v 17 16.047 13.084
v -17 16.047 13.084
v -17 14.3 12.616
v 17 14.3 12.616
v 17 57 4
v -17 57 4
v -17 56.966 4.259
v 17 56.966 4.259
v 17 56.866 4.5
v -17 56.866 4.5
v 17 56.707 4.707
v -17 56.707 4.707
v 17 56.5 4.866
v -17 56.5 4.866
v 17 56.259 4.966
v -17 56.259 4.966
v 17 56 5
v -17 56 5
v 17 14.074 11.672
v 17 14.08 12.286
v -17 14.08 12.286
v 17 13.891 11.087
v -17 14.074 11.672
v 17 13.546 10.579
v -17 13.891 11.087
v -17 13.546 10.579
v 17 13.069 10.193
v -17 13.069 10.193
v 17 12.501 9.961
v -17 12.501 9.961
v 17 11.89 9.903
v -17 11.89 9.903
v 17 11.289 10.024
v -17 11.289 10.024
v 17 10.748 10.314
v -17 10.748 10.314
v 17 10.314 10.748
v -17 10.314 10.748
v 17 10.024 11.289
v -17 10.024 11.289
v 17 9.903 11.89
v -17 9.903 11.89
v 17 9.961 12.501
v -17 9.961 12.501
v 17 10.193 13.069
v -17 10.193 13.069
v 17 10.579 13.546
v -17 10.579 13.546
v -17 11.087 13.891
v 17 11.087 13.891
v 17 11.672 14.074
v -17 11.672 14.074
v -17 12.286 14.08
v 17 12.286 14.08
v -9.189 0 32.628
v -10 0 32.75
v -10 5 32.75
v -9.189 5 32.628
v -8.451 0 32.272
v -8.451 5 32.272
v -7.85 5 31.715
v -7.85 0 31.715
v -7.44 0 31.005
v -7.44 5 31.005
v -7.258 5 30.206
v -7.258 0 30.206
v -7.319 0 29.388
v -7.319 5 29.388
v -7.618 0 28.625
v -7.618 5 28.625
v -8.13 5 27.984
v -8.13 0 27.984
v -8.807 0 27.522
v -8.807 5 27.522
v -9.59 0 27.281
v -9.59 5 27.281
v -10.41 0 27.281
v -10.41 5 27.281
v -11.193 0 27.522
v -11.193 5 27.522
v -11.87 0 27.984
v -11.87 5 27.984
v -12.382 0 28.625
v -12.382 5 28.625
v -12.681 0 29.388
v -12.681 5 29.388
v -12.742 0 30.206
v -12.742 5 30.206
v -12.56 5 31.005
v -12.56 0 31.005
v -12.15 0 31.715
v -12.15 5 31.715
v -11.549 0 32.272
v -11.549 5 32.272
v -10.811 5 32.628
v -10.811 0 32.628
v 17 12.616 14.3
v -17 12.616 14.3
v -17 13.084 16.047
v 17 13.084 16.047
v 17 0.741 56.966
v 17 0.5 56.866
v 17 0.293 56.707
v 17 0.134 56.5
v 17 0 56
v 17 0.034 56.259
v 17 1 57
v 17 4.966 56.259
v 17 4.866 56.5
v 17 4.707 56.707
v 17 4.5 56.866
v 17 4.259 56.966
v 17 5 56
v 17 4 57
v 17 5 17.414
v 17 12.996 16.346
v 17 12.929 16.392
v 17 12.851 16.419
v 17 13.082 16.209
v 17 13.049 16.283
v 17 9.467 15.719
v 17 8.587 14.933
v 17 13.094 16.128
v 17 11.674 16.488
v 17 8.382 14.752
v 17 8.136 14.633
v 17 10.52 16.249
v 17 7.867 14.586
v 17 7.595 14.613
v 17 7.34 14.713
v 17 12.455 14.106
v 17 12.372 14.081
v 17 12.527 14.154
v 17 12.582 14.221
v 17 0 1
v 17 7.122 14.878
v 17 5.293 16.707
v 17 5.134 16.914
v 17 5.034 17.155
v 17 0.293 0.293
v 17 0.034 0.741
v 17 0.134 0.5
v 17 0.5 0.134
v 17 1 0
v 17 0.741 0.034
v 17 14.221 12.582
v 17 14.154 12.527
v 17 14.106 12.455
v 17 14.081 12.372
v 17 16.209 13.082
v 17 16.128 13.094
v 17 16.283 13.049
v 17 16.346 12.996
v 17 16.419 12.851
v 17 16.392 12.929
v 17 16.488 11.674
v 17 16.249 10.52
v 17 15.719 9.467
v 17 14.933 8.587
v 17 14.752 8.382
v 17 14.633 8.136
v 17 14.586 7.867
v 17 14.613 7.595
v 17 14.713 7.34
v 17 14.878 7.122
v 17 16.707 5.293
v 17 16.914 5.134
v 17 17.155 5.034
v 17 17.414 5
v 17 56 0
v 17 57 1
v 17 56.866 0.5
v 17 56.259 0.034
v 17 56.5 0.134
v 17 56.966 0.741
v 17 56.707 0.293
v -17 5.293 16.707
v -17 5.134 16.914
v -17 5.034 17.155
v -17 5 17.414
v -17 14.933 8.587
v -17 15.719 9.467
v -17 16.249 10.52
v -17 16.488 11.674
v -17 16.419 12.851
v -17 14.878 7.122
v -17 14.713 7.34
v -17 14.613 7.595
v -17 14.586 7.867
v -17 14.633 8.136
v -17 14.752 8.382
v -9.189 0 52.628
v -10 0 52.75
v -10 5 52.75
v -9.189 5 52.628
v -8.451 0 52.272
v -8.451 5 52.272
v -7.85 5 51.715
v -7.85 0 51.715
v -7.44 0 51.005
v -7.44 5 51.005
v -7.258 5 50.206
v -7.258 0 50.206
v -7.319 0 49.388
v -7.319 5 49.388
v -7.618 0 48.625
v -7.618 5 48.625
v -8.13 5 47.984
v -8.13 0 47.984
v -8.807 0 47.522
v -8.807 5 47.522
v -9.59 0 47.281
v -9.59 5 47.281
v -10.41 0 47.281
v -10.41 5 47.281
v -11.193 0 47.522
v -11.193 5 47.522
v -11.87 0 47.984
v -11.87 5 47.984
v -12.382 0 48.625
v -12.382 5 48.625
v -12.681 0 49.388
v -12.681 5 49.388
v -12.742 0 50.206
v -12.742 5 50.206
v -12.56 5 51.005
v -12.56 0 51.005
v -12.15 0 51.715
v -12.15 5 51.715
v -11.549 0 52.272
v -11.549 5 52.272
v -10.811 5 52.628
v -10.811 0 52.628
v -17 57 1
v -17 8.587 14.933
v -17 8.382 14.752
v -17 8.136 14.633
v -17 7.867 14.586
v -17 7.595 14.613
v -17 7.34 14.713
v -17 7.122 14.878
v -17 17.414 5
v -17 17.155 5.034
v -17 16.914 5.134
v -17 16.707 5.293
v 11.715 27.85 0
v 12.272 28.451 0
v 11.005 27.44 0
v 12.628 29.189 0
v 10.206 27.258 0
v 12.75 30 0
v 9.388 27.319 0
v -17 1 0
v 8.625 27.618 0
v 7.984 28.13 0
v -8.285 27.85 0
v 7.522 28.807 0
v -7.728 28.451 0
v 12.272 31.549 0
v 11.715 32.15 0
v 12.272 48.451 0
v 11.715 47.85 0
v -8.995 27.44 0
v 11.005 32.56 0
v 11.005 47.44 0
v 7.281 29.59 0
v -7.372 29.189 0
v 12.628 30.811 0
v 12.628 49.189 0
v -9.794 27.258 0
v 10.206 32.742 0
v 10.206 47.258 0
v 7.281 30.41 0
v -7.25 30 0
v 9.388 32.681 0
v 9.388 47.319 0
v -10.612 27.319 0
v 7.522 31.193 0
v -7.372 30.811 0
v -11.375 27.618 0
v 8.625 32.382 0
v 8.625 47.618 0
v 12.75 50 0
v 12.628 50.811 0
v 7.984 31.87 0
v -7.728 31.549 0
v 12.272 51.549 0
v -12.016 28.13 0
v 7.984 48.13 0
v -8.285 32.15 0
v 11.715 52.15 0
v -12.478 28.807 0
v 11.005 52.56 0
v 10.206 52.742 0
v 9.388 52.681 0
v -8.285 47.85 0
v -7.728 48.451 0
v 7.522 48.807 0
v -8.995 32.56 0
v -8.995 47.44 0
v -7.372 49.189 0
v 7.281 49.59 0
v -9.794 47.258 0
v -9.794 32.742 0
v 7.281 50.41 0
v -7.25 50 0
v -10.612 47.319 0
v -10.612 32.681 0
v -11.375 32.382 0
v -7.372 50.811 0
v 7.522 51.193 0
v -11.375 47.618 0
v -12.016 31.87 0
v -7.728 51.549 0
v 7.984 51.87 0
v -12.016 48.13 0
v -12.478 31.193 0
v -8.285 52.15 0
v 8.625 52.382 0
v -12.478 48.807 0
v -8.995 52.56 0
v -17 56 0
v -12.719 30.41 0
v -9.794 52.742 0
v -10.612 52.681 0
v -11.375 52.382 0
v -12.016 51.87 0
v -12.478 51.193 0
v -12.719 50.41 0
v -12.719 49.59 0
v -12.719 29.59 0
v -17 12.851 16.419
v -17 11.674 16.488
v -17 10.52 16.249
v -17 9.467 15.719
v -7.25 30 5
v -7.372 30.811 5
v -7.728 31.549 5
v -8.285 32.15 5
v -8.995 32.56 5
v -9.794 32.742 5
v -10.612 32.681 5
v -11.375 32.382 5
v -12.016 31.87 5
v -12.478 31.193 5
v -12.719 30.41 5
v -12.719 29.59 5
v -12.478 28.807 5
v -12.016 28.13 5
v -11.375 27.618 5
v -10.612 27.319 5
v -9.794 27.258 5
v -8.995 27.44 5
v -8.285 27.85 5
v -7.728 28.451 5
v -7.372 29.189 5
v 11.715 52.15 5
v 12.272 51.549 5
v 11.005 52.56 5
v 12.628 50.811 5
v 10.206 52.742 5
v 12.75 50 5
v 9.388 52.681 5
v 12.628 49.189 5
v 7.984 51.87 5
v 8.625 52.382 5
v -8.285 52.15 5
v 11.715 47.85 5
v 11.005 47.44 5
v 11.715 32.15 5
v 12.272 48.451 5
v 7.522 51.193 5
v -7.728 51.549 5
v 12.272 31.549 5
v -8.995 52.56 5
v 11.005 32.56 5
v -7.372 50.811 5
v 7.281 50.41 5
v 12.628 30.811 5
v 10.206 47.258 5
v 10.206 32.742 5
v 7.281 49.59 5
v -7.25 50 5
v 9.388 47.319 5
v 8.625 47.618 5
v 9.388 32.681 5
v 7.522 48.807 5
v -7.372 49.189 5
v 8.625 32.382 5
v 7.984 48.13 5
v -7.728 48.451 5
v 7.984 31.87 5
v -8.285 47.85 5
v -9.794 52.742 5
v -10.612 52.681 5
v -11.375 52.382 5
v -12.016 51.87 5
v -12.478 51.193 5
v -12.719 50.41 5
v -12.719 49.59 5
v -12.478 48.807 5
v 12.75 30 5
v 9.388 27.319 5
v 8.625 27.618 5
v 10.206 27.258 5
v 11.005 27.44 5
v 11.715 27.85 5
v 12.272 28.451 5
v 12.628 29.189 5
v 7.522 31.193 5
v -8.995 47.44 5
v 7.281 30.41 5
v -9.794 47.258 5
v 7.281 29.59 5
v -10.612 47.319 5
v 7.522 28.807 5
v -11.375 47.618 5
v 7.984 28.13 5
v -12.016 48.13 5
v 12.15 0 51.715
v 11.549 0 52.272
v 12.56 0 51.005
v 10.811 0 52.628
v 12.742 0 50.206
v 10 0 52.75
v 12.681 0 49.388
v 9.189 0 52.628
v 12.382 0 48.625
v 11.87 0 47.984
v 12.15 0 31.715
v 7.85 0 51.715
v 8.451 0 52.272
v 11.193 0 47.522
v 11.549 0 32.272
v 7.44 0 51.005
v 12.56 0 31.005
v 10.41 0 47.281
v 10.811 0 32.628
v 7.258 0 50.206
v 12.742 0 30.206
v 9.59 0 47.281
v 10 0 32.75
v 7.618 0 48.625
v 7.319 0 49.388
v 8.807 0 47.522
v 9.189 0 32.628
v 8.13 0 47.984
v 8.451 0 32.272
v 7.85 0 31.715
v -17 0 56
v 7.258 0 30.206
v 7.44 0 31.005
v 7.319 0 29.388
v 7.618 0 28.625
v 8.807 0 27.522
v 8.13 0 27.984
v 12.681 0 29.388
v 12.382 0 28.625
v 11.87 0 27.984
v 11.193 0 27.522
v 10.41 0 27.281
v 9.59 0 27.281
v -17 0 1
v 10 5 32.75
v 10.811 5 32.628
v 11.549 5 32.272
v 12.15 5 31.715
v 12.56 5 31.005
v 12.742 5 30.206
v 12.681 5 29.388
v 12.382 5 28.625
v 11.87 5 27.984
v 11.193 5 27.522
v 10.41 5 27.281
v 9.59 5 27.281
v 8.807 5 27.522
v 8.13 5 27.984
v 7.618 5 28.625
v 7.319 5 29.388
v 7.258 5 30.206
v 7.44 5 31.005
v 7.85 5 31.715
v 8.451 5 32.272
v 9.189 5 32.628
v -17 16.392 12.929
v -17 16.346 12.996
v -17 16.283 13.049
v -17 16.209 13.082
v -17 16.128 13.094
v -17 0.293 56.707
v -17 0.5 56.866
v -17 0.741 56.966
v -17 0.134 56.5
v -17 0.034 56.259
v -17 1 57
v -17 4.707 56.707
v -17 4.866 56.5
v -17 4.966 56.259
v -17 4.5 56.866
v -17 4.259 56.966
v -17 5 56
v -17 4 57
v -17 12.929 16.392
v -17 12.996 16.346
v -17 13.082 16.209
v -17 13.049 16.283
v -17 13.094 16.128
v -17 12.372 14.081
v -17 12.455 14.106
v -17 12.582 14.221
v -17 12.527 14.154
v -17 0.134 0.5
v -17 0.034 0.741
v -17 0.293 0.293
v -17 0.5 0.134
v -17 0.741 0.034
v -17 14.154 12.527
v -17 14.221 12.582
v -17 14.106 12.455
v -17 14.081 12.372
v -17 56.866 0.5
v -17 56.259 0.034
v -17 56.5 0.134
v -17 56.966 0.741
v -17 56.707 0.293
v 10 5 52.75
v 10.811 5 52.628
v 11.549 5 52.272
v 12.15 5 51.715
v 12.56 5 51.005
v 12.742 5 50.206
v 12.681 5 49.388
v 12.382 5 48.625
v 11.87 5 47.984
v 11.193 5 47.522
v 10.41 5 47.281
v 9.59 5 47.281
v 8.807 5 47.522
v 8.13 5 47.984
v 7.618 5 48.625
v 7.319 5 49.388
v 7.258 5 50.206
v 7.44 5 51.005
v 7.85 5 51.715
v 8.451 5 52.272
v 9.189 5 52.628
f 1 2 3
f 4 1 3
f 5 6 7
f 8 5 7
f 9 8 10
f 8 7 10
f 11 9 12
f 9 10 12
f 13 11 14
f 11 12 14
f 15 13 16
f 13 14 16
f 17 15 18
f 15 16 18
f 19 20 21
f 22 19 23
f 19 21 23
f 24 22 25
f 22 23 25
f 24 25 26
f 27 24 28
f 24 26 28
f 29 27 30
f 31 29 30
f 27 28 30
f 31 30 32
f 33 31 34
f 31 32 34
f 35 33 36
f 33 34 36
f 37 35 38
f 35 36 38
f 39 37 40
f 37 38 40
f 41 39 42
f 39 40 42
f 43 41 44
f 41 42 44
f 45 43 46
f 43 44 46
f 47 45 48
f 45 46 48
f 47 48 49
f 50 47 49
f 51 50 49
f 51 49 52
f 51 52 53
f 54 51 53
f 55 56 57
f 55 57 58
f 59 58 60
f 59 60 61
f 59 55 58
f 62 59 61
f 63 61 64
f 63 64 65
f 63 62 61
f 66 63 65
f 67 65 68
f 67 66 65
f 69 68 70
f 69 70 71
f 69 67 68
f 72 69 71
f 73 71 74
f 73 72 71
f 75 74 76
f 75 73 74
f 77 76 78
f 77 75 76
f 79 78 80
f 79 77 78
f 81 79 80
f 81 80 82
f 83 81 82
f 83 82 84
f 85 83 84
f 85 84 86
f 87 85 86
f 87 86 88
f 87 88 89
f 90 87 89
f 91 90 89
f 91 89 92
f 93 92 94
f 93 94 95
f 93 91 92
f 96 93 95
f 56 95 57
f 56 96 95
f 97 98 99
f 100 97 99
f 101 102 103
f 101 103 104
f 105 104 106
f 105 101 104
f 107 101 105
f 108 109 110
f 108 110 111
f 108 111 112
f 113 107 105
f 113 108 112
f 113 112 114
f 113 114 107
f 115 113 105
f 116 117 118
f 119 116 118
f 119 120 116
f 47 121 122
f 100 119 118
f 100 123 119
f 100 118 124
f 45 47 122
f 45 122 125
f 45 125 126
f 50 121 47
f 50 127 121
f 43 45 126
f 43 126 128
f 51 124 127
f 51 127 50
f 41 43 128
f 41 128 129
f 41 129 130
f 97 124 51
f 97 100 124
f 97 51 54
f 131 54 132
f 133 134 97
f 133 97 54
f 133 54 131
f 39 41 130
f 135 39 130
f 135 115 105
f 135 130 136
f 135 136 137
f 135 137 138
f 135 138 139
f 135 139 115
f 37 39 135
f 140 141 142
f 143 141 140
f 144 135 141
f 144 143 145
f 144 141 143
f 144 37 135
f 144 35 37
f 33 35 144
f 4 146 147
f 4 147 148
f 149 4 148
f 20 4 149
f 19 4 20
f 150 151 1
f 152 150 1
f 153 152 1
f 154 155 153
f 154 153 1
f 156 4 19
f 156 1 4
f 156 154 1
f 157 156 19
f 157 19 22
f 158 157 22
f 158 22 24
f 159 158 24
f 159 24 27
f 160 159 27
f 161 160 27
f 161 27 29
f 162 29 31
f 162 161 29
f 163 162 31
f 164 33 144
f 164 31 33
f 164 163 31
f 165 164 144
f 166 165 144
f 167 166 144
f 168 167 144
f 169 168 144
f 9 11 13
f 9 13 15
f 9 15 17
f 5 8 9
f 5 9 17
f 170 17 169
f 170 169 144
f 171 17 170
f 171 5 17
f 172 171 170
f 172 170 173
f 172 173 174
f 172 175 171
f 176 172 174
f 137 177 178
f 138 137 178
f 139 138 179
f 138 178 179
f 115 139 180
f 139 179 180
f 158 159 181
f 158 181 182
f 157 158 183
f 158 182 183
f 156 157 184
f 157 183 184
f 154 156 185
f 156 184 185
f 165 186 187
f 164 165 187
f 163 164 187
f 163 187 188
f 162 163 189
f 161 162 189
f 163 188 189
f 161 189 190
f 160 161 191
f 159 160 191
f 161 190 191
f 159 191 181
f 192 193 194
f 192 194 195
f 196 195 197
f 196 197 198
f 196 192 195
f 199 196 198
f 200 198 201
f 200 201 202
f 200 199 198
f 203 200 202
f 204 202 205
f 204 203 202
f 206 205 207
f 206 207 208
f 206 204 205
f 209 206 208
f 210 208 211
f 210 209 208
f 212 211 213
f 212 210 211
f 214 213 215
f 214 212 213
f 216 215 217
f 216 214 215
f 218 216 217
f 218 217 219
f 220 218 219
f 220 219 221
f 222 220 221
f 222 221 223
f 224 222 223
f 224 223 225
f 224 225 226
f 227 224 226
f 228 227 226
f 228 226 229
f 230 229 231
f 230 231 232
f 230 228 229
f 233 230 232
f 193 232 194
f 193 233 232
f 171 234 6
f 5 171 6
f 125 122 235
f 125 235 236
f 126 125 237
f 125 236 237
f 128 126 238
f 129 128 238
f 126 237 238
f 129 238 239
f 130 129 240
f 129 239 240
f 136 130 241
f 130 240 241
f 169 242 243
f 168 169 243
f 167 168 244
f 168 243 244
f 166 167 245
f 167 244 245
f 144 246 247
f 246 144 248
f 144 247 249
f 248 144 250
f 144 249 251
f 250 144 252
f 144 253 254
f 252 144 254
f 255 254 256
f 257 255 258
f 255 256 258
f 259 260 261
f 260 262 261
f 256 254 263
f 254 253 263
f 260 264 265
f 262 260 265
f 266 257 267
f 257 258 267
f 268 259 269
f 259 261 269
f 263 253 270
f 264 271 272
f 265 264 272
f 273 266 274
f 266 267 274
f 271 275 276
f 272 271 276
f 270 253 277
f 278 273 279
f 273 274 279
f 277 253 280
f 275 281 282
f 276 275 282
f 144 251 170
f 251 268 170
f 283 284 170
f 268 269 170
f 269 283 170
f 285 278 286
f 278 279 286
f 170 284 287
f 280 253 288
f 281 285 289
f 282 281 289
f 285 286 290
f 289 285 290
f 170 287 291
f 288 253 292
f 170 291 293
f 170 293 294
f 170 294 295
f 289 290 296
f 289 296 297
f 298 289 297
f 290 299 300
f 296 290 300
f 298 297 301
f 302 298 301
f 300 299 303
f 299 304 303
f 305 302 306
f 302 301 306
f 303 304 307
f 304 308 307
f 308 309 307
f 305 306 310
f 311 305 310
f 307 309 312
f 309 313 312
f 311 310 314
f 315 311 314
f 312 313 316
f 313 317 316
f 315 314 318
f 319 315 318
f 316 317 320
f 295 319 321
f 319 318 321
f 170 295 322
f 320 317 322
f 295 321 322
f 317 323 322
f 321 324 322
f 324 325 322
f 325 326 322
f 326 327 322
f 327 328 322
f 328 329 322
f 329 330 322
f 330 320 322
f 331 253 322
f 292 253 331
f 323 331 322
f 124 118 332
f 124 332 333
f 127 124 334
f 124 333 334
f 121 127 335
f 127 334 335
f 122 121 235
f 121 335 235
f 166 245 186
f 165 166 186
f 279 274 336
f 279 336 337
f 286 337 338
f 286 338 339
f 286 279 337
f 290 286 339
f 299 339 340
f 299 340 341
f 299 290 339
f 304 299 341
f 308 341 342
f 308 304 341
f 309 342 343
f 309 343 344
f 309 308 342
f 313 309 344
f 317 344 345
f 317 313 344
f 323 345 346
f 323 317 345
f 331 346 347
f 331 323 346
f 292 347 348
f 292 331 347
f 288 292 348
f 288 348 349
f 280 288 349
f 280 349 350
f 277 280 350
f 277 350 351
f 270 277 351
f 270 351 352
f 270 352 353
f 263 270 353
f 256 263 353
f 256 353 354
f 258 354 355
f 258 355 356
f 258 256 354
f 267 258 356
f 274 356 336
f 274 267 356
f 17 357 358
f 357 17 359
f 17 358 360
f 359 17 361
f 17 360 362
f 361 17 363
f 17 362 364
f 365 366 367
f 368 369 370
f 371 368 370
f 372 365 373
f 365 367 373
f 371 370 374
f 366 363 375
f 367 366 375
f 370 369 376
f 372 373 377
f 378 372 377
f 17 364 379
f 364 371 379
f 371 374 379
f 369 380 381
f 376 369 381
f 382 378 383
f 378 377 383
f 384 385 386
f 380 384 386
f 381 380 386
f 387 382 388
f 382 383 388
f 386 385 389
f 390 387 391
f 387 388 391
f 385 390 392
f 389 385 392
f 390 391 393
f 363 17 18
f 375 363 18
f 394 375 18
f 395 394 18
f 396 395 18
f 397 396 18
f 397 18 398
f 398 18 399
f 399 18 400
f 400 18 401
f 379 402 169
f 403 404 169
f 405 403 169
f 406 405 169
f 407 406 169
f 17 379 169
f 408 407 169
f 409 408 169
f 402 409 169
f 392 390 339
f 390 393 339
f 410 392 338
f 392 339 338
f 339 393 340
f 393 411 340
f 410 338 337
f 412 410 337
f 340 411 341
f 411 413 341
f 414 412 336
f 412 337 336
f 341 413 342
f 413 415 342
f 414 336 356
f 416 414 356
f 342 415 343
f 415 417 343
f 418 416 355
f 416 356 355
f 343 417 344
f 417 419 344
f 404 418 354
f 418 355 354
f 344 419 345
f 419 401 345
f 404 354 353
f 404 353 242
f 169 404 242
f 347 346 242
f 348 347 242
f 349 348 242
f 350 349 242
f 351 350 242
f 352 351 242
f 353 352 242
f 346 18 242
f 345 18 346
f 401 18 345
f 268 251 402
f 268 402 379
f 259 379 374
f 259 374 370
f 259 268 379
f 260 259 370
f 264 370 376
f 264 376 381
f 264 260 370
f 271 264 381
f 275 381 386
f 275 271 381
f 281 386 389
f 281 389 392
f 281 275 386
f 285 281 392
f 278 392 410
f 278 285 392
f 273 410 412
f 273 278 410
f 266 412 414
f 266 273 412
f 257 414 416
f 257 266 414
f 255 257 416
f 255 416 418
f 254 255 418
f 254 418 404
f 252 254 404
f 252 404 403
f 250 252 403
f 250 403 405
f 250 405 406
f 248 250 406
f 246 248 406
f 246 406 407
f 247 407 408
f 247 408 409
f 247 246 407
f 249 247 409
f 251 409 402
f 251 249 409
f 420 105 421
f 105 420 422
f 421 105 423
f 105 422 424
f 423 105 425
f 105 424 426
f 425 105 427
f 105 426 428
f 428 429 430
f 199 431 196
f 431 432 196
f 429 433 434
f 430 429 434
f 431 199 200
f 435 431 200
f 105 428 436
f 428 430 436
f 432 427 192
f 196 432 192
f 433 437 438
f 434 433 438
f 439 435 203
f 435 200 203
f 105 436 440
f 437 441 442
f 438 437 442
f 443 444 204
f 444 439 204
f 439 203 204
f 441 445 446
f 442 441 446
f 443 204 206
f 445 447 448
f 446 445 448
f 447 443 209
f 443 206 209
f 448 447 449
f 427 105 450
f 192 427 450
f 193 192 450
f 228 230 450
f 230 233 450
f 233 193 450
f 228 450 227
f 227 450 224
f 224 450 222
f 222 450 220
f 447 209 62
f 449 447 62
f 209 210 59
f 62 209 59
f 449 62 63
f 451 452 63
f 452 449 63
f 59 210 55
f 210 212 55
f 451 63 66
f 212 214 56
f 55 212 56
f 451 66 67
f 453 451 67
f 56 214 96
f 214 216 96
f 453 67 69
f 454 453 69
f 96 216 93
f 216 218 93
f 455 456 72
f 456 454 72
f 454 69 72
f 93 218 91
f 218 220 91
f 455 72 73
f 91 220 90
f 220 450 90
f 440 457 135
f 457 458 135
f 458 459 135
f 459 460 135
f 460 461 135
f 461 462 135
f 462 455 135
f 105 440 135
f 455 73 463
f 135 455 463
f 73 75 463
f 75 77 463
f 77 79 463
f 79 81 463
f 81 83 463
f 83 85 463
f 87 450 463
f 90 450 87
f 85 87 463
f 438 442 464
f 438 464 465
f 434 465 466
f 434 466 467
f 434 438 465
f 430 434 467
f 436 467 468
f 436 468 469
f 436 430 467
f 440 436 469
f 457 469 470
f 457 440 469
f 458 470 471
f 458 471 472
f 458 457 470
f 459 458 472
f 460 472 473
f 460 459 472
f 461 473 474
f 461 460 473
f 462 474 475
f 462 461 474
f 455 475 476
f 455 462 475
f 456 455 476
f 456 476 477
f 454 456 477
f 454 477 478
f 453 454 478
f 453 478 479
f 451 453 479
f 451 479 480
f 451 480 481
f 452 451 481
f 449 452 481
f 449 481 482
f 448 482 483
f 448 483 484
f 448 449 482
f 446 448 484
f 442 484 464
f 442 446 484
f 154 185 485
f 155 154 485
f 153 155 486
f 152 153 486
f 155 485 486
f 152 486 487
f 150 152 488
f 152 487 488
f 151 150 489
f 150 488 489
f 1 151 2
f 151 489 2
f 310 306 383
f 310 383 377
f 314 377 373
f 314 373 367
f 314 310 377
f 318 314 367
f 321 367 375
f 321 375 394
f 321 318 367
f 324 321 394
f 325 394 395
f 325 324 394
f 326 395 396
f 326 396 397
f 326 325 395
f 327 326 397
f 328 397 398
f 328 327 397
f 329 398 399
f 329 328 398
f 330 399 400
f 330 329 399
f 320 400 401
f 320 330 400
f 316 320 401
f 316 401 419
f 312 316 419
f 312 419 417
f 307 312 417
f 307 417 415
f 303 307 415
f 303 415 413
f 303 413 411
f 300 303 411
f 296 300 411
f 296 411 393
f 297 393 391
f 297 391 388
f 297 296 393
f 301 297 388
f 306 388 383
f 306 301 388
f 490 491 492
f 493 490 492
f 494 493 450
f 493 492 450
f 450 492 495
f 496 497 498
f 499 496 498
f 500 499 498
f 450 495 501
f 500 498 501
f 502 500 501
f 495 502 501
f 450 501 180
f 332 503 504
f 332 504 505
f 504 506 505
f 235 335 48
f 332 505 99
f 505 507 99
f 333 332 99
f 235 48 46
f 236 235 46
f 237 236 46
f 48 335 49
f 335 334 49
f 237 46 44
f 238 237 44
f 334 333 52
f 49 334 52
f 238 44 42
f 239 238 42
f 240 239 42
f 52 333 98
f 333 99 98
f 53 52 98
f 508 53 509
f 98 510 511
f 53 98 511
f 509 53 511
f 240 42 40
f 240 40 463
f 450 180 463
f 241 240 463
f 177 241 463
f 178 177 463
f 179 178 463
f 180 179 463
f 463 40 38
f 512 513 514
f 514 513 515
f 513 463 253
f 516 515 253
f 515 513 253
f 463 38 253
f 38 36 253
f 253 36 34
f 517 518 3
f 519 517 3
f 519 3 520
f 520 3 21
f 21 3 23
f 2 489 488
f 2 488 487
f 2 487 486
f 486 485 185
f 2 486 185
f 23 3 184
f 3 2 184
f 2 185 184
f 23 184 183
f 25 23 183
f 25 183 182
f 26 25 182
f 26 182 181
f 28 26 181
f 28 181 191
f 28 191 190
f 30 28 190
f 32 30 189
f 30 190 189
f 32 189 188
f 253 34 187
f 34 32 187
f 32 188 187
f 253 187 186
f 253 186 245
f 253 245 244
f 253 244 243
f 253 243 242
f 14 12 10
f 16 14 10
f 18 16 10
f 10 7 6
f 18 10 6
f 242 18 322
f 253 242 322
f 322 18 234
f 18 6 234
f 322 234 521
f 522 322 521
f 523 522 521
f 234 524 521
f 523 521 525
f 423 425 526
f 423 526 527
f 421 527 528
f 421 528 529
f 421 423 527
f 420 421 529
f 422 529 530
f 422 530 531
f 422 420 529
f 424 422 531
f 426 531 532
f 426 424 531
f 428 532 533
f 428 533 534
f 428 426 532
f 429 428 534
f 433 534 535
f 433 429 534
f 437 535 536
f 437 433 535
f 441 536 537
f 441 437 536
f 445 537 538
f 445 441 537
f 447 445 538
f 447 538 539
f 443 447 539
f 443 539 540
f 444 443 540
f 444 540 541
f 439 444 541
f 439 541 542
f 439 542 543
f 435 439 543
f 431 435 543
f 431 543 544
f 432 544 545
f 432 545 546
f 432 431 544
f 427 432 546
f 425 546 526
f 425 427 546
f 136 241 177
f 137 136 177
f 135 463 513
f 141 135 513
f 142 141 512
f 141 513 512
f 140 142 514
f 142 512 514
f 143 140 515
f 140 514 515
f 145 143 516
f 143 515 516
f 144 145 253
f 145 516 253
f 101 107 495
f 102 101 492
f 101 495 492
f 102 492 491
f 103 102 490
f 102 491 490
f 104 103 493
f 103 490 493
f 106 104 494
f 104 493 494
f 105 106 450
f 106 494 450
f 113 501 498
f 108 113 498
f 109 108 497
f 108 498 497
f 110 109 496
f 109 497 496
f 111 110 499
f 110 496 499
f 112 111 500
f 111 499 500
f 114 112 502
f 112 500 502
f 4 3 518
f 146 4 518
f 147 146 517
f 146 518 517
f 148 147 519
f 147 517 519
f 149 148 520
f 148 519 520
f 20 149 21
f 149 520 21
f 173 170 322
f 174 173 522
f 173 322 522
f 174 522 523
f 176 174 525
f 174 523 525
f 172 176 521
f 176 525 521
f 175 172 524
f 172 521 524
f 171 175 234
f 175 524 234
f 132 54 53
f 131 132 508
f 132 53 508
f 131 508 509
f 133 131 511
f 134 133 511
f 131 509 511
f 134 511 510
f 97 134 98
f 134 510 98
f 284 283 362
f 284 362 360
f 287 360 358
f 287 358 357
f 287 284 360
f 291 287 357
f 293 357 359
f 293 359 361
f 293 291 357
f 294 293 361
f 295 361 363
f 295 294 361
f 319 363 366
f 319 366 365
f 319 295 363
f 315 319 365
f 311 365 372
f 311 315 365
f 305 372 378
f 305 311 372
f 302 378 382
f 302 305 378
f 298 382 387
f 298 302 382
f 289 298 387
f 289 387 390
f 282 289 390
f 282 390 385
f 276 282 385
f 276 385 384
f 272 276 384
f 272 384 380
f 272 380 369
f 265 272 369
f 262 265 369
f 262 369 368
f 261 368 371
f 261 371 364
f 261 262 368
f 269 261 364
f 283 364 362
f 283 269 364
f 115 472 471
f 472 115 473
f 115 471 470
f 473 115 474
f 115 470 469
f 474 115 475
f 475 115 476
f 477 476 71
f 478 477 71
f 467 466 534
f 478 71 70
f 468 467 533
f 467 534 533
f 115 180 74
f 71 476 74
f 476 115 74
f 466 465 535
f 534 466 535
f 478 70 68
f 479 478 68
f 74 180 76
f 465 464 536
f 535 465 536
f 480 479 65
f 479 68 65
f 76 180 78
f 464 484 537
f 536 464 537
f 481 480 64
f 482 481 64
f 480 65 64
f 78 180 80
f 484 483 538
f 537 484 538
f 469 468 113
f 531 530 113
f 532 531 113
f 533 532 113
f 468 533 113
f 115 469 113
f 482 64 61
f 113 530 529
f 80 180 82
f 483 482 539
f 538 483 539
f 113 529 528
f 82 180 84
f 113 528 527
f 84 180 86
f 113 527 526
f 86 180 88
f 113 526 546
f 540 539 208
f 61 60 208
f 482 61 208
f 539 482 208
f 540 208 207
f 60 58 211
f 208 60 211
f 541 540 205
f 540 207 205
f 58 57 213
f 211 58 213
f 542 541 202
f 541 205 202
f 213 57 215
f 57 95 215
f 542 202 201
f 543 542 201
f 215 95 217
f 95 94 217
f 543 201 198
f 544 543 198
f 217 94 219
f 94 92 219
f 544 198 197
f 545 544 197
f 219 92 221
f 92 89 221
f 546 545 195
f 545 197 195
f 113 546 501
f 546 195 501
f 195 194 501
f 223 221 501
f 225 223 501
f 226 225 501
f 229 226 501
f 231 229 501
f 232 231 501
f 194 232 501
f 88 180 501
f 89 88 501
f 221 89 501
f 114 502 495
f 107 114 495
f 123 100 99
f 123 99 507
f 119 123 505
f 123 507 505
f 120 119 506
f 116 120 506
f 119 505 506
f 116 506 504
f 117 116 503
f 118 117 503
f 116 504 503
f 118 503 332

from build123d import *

# Parameters (mm, degrees)
BOSS_EXTRUDE1_DEPTH      = 17
BOSS_EXTRUDE1_DEPTH_BACK = 17
SKETCH2_R                = 2.75
CUT_EXTRUDE1_DEPTH       = 5
SKETCH3_R                = 2.75
CUT_EXTRUDE2_DEPTH       = 5
SKETCH4_R                = 2.75
CUT_EXTRUDE3_DEPTH       = 5
SKETCH5_R                = 2.75
CUT_EXTRUDE4_DEPTH       = 5
SKETCH6_R                = 2.75
CUT_EXTRUDE5_DEPTH       = 5
SKETCH7_R                = 2.75
CUT_EXTRUDE6_DEPTH       = 5
SKETCH8_R                = 2.75
CUT_EXTRUDE7_DEPTH       = 5
SKETCH9_R                = 2.75
CUT_EXTRUDE8_DEPTH       = 5


with BuildPart() as part:
    # Sketch1 → Boss-Extrude1 (new, two sides: drawn at the far end of the back side and taken through both)
    with BuildSketch(Plane(origin=(0, 0, 0), x_dir=(0, 0, -1), z_dir=(1, 0, 0)).offset(-BOSS_EXTRUDE1_DEPTH_BACK)):
        with BuildLine():
            Line((-56, 0), (-1, 0))
            ThreePointArc((-1, 0), (-0.292893219, 0.292893219), (0, 1))
            Line((0, 1), (0, 56))
            ThreePointArc((0, 56), (-0.292893219, 56.707106781), (-1, 57))
            Line((-1, 57), (-4, 57))
            ThreePointArc((-4, 57), (-4.707106781, 56.707106781), (-5, 56))
            Line((-5, 56), (-5, 17.414213562))
            ThreePointArc((-5, 17.414213562), (-5.076120467, 17.03153013), (-5.292893219, 16.707106781))
            Line((-5.292893219, 16.707106781), (-7.121957509, 14.878042491))
            ThreePointArc((-7.121957509, 14.878042491), (-7.866746832, 14.585859511), (-8.587416237, 14.93330395))
            ThreePointArc((-8.587416237, 14.93330395), (-10.519537564, 16.249497732), (-12.851234525, 16.418755456))
            ThreePointArc((-12.851234525, 16.418755456), (-13.048766707, 16.283360738), (-13.084263382, 16.046526031))
            Line((-13.084263382, 16.046526031), (-12.616293745, 14.300039569))
            ThreePointArc((-12.616293745, 14.300039569), (-12.492491512, 14.127781044), (-12.285701536, 14.080474617))
            ThreePointArc((-12.285701536, 14.080474617), (-10.515075746, 10.515075773), (-14.080474622, 12.285701498))
            ThreePointArc((-14.080474622, 12.285701498), (-14.127781033, 12.492491496), (-14.300039569, 12.616293745))
            Line((-14.300039569, 12.616293745), (-16.046526031, 13.084263382))
            ThreePointArc((-16.046526031, 13.084263382), (-16.283360688, 13.048766739), (-16.418755434, 12.851234641))
            ThreePointArc((-16.418755434, 12.851234641), (-16.249497766, 10.51953766), (-14.933304014, 8.587416292))
            ThreePointArc((-14.933304014, 8.587416292), (-14.585859513, 7.866746874), (-14.878042491, 7.121957509))
            Line((-14.878042491, 7.121957509), (-16.707106781, 5.292893219))
            ThreePointArc((-16.707106781, 5.292893219), (-17.03153013, 5.076120467), (-17.414213562, 5))
            Line((-17.414213562, 5), (-56, 5))
            ThreePointArc((-56, 5), (-56.707106781, 4.707106781), (-57, 4))
            Line((-57, 4), (-57, 1))
            ThreePointArc((-57, 1), (-56.707106781, 0.292893219), (-56, 0))
        make_face()
    extrude(amount=BOSS_EXTRUDE1_DEPTH + BOSS_EXTRUDE1_DEPTH_BACK)

    # Sketch2 → Cut-Extrude1 (cut)
    with BuildSketch(Plane(origin=(0, 0, 0), x_dir=(1, 0, 0), z_dir=(0, 1, 0))):
        with Locations((-10, -30)):
            Circle(SKETCH2_R)
    extrude(amount=CUT_EXTRUDE1_DEPTH, mode=Mode.SUBTRACT)

    # Sketch3 → Cut-Extrude2 (cut)
    with BuildSketch(Plane(origin=(0, 0, 0), x_dir=(1, 0, 0), z_dir=(0, 1, 0))):
        with Locations((-10, -50)):
            Circle(SKETCH3_R)
    extrude(amount=CUT_EXTRUDE2_DEPTH, mode=Mode.SUBTRACT)

    # Sketch4 → Cut-Extrude3 (cut)
    with BuildSketch(Plane(origin=(0, 0, 0), x_dir=(1, 0, 0), z_dir=(0, 1, 0))):
        with Locations((10, -30)):
            Circle(SKETCH4_R)
    extrude(amount=CUT_EXTRUDE3_DEPTH, mode=Mode.SUBTRACT)

    # Sketch5 → Cut-Extrude4 (cut)
    with BuildSketch(Plane(origin=(0, 0, 0), x_dir=(1, 0, 0), z_dir=(0, 1, 0))):
        with Locations((10, -50)):
            Circle(SKETCH5_R)
    extrude(amount=CUT_EXTRUDE4_DEPTH, mode=Mode.SUBTRACT)

    # Sketch6 → Cut-Extrude5 (cut)
    with BuildSketch(Plane.XY):
        with Locations((-10, 30)):
            Circle(SKETCH6_R)
    extrude(amount=CUT_EXTRUDE5_DEPTH, mode=Mode.SUBTRACT)

    # Sketch7 → Cut-Extrude6 (cut)
    with BuildSketch(Plane.XY):
        with Locations((10, 30)):
            Circle(SKETCH7_R)
    extrude(amount=CUT_EXTRUDE6_DEPTH, mode=Mode.SUBTRACT)

    # Sketch8 → Cut-Extrude7 (cut)
    with BuildSketch(Plane.XY):
        with Locations((-10, 50)):
            Circle(SKETCH8_R)
    extrude(amount=CUT_EXTRUDE7_DEPTH, mode=Mode.SUBTRACT)

    # Sketch9 → Cut-Extrude8 (cut)
    with BuildSketch(Plane.XY):
        with Locations((10, 50)):
            Circle(SKETCH9_R)
    extrude(amount=CUT_EXTRUDE8_DEPTH, mode=Mode.SUBTRACT)


solid = part.part
